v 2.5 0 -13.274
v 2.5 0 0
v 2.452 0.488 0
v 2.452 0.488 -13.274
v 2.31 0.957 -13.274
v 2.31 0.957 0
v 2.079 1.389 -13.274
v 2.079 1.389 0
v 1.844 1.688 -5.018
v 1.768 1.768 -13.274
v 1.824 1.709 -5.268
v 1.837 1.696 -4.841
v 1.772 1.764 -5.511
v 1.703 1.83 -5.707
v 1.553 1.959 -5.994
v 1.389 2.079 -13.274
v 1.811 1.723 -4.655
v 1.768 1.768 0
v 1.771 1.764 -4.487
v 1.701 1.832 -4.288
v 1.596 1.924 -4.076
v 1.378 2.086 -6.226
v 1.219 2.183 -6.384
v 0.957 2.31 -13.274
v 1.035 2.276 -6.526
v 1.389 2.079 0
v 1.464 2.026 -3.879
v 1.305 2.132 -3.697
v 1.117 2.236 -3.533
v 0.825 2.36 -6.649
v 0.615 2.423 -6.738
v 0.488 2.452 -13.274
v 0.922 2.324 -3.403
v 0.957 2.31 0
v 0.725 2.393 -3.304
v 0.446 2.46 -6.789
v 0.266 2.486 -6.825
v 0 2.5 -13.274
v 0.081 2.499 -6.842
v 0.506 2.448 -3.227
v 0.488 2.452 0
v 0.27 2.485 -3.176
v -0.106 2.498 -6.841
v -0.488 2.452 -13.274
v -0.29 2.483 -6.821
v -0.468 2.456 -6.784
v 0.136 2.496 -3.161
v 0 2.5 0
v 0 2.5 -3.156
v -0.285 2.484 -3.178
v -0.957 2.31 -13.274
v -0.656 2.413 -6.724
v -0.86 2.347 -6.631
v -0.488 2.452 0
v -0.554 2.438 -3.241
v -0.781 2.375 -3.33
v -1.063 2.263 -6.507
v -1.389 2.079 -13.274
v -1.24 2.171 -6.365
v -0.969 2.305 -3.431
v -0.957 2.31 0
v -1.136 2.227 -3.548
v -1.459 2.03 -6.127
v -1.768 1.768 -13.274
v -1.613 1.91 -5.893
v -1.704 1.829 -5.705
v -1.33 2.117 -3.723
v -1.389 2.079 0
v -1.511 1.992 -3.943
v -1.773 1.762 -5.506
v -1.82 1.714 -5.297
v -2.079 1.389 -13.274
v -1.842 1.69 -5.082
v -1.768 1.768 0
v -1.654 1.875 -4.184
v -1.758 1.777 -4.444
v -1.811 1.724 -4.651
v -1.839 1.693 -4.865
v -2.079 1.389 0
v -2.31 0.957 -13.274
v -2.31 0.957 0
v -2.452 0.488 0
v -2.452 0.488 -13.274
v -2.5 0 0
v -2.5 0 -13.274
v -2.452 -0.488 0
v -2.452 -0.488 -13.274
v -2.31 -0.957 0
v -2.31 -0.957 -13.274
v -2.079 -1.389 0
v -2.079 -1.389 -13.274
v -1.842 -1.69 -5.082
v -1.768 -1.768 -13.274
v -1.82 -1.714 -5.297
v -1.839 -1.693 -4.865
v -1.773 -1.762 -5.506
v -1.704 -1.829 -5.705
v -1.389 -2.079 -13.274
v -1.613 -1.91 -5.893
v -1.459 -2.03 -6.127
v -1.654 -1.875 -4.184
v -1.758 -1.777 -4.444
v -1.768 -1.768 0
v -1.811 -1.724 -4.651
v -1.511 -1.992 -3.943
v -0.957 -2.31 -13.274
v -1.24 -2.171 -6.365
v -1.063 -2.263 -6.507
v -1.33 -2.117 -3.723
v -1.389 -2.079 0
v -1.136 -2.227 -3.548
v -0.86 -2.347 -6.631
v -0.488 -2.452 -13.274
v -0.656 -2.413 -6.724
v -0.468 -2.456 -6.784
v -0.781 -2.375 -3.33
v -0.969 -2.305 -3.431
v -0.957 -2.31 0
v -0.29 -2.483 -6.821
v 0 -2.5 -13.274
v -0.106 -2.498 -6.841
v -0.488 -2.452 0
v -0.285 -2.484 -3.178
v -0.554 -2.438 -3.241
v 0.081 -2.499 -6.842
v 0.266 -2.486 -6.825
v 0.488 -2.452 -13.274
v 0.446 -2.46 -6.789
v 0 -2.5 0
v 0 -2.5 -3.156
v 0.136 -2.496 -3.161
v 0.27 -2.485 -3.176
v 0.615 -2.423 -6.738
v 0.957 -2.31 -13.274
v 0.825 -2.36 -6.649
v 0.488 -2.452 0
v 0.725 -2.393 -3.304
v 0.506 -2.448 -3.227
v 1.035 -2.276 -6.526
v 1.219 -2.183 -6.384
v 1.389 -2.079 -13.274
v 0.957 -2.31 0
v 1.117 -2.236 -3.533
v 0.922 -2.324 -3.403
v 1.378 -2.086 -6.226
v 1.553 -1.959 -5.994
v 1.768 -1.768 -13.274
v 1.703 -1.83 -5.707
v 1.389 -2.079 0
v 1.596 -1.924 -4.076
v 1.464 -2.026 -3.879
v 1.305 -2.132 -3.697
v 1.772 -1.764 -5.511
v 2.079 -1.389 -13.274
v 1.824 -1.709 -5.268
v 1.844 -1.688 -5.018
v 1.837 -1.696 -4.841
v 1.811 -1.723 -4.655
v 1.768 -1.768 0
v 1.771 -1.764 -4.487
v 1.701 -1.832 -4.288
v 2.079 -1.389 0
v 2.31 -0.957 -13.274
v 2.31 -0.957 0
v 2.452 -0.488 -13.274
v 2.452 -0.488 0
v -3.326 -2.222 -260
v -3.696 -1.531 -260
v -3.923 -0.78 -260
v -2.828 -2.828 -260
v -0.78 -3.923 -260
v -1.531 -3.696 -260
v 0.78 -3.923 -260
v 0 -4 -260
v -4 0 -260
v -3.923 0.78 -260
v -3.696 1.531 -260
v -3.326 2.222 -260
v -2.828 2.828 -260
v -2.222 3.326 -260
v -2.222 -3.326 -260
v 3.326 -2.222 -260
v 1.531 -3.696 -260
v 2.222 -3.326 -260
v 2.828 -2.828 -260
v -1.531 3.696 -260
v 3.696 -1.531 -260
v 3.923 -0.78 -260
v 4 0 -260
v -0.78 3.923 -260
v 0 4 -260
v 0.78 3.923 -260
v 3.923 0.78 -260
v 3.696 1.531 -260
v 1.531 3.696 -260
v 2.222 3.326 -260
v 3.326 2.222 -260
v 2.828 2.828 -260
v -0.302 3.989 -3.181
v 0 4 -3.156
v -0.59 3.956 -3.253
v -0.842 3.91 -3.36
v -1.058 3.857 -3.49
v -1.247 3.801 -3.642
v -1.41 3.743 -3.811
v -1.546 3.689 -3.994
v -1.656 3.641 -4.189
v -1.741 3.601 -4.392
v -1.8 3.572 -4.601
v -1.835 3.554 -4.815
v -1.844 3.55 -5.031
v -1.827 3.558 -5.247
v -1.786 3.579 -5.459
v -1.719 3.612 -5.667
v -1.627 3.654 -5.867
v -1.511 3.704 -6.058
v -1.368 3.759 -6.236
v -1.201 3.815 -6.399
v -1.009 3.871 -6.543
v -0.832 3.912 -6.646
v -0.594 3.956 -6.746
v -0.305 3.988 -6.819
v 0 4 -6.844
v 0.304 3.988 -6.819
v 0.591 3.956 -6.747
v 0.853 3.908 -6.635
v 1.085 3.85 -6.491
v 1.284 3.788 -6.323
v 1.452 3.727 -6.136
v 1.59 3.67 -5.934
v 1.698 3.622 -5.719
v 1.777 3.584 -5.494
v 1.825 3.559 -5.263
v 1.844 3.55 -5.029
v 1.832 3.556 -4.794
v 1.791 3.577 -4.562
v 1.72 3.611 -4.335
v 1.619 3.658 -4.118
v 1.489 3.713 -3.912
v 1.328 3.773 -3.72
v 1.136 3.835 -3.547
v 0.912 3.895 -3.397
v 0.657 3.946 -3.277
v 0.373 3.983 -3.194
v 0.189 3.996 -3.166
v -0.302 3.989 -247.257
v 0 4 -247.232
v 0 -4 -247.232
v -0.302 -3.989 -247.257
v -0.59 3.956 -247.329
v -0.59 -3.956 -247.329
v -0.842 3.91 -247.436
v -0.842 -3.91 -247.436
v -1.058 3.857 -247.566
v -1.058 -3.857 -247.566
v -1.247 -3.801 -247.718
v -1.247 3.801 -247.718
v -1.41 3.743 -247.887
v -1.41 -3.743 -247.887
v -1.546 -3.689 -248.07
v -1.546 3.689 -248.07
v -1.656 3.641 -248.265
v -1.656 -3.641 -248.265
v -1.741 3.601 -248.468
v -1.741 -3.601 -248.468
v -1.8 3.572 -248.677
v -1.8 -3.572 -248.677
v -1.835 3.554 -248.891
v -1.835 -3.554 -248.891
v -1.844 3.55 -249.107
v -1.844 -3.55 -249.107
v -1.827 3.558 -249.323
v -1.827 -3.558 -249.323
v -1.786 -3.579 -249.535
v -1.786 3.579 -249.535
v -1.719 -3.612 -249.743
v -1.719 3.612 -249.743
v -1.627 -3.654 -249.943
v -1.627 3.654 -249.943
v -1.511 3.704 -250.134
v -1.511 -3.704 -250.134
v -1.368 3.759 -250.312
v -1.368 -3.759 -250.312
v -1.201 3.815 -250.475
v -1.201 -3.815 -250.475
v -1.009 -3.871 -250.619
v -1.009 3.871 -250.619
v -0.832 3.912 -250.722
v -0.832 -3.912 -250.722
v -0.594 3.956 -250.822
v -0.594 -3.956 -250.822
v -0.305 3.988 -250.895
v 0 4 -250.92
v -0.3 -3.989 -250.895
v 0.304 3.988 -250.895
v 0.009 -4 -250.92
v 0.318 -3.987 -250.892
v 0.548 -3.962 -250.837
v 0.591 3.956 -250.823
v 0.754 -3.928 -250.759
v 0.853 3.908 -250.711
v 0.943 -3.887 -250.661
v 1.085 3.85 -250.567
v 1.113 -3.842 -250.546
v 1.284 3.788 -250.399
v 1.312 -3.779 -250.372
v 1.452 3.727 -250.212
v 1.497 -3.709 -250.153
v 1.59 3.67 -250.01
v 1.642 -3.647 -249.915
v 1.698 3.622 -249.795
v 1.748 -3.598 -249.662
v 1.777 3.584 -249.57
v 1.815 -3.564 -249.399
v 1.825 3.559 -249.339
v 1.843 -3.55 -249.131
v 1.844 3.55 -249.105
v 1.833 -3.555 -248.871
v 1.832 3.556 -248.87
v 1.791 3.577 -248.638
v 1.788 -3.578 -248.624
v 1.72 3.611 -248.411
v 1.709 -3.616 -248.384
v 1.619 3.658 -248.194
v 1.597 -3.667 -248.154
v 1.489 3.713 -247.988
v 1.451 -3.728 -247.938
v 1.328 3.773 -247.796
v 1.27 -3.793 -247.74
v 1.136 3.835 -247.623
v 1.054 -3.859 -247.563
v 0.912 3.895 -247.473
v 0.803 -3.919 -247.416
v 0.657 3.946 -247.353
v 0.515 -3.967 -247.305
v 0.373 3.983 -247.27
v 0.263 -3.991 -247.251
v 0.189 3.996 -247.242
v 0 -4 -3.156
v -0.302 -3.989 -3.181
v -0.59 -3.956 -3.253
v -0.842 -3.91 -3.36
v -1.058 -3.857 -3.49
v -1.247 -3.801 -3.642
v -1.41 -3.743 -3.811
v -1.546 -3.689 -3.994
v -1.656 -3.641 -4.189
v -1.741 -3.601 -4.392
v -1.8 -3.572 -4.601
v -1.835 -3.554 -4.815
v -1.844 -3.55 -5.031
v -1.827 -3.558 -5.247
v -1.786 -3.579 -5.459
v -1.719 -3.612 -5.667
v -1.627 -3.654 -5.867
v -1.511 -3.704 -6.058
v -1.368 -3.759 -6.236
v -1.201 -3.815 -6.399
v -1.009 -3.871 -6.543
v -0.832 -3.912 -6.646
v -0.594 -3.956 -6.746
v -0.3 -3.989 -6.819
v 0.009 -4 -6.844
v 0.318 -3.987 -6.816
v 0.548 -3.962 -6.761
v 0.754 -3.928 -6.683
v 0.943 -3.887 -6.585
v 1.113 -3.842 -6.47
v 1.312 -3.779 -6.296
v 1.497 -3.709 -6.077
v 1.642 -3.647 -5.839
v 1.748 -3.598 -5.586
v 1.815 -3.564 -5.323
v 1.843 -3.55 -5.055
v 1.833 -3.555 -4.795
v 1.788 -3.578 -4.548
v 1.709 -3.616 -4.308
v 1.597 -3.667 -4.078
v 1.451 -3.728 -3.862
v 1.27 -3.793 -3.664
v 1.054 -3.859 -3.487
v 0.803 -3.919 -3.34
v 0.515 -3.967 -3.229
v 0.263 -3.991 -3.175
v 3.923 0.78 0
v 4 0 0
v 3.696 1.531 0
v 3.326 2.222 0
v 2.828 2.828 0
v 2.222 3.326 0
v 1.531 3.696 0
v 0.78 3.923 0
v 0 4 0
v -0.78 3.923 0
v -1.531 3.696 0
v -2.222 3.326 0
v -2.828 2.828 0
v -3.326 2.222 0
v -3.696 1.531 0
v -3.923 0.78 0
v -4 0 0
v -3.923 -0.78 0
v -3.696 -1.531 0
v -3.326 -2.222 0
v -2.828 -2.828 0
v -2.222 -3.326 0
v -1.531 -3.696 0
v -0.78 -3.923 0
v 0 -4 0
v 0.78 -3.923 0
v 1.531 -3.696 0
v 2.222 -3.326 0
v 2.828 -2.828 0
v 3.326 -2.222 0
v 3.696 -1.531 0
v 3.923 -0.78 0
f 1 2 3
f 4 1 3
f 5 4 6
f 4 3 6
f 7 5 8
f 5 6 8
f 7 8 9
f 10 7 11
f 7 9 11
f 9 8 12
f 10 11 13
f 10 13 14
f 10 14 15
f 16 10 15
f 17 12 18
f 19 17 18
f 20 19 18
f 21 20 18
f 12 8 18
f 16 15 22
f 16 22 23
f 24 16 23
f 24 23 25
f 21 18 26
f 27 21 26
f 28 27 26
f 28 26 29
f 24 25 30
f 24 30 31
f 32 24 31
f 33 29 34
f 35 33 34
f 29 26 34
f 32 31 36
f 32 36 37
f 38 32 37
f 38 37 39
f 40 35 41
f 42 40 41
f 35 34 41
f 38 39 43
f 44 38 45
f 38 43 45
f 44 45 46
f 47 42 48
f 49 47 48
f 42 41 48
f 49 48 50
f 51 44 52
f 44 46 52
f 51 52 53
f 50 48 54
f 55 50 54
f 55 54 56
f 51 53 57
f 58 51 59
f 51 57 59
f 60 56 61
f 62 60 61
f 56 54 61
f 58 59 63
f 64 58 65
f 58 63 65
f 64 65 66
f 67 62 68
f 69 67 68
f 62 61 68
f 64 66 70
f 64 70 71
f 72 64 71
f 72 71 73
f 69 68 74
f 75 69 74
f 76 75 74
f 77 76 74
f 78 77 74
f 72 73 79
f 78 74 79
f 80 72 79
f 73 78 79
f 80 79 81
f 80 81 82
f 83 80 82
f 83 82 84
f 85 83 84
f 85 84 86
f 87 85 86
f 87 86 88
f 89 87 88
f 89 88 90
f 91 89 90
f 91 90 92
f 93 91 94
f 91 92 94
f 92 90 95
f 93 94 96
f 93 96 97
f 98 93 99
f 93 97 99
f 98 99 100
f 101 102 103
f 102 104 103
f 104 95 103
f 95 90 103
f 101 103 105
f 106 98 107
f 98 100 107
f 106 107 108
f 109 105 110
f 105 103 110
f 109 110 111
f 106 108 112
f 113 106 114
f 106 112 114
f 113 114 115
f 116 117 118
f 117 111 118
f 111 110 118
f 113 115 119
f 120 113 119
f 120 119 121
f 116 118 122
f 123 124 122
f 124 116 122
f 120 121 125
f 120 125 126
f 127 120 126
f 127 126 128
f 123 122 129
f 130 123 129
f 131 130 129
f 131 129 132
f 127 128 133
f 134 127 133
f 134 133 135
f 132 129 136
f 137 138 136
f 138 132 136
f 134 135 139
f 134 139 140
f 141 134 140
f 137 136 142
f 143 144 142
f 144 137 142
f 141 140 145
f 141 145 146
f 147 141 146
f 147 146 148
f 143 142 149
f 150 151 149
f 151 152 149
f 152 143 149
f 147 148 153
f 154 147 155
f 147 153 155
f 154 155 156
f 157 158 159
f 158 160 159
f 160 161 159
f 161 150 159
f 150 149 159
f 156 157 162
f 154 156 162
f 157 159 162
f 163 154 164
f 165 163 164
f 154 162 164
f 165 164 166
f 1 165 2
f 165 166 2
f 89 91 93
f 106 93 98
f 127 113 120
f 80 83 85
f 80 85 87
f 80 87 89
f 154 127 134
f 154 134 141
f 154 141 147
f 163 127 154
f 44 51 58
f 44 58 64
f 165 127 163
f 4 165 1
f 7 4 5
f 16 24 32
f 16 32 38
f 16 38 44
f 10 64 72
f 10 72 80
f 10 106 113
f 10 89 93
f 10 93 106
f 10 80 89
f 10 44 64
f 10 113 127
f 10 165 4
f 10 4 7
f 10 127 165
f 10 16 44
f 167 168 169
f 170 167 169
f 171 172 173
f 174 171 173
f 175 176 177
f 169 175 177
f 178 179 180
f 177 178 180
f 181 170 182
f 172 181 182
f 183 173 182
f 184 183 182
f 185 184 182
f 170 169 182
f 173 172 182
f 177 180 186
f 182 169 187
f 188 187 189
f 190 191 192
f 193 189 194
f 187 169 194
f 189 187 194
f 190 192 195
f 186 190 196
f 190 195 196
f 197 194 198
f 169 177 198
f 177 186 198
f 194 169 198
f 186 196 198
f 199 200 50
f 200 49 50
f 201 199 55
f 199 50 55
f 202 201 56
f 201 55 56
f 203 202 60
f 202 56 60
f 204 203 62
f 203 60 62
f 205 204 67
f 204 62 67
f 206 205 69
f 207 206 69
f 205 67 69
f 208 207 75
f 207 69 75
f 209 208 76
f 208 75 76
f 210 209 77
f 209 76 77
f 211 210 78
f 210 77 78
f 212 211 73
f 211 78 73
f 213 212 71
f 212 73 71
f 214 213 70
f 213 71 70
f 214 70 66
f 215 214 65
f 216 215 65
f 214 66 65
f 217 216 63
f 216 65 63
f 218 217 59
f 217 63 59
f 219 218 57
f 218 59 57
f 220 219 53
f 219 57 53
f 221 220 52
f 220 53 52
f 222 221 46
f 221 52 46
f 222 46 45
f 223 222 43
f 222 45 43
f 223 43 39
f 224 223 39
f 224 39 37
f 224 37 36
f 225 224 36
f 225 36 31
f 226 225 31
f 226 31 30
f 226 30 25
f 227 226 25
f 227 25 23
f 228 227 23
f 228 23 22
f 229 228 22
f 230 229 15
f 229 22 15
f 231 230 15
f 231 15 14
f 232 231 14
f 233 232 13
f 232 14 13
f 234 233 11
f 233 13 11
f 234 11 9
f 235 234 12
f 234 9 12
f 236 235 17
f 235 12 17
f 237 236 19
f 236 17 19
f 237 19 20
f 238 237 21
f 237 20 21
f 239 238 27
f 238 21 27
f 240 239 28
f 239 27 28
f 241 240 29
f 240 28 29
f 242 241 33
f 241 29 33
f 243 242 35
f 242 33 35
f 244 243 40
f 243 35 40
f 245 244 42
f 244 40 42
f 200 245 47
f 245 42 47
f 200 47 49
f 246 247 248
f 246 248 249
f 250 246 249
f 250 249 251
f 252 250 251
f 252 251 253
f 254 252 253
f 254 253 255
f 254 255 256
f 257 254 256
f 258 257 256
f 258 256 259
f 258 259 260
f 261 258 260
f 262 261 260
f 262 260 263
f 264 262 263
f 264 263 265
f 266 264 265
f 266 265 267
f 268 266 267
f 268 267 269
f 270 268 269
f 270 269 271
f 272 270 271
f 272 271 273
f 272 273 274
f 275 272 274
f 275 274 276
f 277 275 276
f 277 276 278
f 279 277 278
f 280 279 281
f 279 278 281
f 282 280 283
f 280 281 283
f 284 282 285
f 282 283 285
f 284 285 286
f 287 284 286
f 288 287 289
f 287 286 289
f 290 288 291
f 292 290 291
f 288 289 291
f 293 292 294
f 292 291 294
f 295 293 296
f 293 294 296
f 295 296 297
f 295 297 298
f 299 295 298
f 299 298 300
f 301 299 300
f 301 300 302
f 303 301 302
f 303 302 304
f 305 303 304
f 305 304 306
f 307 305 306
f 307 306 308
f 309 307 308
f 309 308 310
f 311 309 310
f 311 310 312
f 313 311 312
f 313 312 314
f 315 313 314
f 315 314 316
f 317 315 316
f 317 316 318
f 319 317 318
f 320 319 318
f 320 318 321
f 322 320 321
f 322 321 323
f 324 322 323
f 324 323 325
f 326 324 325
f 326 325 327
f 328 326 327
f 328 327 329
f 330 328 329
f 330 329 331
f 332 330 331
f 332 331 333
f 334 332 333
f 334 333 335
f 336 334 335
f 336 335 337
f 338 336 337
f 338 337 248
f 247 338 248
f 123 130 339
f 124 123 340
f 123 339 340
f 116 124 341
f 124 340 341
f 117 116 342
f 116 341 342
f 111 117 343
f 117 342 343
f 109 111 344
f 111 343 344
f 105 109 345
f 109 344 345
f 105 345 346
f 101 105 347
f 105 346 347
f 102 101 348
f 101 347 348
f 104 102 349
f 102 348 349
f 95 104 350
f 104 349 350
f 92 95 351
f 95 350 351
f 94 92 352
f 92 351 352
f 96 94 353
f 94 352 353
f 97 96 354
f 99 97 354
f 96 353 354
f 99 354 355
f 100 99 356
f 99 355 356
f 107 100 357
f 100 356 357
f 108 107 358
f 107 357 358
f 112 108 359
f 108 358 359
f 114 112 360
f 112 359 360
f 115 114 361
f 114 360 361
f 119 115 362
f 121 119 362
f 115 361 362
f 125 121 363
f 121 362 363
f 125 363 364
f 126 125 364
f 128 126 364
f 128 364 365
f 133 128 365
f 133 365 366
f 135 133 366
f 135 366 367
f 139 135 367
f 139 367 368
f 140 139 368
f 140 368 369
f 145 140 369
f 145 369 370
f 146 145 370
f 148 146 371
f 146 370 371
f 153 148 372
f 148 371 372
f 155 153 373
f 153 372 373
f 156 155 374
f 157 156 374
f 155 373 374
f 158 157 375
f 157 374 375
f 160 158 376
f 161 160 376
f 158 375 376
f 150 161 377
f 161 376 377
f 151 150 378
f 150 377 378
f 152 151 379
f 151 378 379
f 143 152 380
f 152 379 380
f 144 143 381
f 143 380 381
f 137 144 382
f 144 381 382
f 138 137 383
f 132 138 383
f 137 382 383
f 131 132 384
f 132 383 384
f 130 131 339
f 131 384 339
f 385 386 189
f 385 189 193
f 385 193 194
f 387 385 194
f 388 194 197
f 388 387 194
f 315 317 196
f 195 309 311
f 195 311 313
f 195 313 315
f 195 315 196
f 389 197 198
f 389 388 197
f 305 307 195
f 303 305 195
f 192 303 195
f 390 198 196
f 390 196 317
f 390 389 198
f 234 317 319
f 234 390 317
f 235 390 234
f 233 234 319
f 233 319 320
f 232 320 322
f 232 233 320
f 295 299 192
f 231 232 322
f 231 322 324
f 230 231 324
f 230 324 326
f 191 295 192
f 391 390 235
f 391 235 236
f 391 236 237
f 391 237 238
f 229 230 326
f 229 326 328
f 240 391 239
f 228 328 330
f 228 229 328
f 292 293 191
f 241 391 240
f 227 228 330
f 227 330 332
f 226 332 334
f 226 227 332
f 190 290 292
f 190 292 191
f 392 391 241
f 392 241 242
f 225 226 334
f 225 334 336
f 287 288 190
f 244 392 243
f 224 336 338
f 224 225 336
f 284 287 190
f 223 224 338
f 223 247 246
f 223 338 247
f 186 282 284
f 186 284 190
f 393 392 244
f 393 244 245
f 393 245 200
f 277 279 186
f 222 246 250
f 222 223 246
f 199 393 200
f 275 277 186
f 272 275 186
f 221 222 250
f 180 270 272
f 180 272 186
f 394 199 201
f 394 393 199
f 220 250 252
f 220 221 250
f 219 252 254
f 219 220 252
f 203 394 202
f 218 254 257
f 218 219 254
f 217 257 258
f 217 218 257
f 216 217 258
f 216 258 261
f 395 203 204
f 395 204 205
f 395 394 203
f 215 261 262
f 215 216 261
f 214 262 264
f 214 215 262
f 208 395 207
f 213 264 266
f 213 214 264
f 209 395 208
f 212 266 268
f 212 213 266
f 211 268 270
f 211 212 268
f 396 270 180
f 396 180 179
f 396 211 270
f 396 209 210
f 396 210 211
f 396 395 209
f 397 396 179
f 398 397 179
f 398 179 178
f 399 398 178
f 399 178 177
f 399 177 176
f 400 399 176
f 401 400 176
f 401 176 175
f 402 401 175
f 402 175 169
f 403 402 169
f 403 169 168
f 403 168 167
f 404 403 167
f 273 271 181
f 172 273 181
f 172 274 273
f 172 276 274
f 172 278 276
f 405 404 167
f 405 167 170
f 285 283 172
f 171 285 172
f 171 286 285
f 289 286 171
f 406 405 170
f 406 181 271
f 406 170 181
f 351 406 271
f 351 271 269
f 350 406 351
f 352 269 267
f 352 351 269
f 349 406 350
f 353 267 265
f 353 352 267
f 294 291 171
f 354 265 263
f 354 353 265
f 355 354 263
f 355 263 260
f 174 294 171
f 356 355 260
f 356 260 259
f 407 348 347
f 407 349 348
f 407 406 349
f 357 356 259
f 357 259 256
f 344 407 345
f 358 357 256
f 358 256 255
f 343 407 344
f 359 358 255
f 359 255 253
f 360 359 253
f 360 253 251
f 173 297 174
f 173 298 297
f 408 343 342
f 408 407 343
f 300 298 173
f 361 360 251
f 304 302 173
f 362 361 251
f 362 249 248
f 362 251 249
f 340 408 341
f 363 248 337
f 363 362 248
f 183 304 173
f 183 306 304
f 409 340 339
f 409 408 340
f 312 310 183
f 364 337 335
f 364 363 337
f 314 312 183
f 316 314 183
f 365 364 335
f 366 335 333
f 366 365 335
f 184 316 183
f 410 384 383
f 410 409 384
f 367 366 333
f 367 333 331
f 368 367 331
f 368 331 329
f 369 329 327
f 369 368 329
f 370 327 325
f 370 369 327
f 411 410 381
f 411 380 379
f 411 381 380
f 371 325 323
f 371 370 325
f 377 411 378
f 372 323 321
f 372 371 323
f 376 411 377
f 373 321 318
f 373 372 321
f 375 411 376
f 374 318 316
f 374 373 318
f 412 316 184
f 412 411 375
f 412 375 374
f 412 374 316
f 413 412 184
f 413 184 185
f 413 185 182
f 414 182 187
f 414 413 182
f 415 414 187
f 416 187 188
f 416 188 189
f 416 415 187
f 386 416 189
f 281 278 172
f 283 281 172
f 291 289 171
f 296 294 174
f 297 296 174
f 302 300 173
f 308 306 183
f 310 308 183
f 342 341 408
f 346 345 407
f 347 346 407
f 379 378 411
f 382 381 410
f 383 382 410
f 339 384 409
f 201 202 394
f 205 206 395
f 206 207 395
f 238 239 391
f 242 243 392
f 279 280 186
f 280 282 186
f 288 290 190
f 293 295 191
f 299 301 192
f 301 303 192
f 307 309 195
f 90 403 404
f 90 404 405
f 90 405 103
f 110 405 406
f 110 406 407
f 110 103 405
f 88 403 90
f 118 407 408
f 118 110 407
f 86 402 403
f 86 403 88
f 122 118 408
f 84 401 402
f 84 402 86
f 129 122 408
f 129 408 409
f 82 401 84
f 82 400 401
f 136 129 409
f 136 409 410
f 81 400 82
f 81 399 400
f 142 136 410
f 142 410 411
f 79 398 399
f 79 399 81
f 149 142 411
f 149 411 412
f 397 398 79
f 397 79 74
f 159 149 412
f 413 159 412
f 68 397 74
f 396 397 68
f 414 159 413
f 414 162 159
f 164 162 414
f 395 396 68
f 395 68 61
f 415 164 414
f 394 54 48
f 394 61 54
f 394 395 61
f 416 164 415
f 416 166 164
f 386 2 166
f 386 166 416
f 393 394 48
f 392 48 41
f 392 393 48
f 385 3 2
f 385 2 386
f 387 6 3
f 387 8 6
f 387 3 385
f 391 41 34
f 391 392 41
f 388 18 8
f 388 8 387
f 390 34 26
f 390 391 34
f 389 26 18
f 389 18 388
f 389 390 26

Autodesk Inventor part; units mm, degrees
ref_plane "YZ Plane" through (0, 0, 0) normal (1, 0, 0) x (0, 1, 0)
ref_plane "XY Plane" through (0, 0, 0) normal (0, 0, 1) x (1, 0, 0)
sketch "Sketch1" plane through (0, 0, 0) normal (0, 0, 1) x (1, 0, 0)
  circle A0 centre (0, 0) radius 4
  dimension "d0" = 8
extrude "Extrusion1" add sketch "Sketch1" against normal blind 260
ref_plane "Work Plane1" through (0, 4, 0) normal (0, 1, 0) x (-1, 0, 0)
sketch "Sketch2" plane through (0, 4, 0) normal (0, 1, 0) x (-1, 0, 0)
  line L0 (-4, -260) -> (4, -260) construction
  line L1 (4, 0) -> (-4, 0) construction
  point P0 (0, 0)
  point P1 (0, -5)
  dimension "d11" = 5
hole "Hole1" at (0, 4, -5) direction (0, -1, 0) diameter 3.688 end through all
sketch "Sketch3" plane through (0, 4, 0) normal (0, 1, 0) x (-1, 0, 0)
  line L0 (-4, -260) -> (4, -260) construction
  line L1 (0, -260) -> (0, -249.076) construction
  point P0 (0, 0)
  dimension "d12" = 10.924
hole "Hole2" at (0, 4, -249.076) direction (0, -1, 0) diameter 3.688 end through all
sketch "Sketch4" plane through (0, 0, 0) normal (0, 0, 1) x (1, 0, 0)
  circle A0 centre (0, 0) radius 2.5
  dimension "d20" = 5
extrude "Extrusion2" cut sketch "Sketch4" against normal blind 13.274
properties part number "driveshaft" material "Steel, Mild"
